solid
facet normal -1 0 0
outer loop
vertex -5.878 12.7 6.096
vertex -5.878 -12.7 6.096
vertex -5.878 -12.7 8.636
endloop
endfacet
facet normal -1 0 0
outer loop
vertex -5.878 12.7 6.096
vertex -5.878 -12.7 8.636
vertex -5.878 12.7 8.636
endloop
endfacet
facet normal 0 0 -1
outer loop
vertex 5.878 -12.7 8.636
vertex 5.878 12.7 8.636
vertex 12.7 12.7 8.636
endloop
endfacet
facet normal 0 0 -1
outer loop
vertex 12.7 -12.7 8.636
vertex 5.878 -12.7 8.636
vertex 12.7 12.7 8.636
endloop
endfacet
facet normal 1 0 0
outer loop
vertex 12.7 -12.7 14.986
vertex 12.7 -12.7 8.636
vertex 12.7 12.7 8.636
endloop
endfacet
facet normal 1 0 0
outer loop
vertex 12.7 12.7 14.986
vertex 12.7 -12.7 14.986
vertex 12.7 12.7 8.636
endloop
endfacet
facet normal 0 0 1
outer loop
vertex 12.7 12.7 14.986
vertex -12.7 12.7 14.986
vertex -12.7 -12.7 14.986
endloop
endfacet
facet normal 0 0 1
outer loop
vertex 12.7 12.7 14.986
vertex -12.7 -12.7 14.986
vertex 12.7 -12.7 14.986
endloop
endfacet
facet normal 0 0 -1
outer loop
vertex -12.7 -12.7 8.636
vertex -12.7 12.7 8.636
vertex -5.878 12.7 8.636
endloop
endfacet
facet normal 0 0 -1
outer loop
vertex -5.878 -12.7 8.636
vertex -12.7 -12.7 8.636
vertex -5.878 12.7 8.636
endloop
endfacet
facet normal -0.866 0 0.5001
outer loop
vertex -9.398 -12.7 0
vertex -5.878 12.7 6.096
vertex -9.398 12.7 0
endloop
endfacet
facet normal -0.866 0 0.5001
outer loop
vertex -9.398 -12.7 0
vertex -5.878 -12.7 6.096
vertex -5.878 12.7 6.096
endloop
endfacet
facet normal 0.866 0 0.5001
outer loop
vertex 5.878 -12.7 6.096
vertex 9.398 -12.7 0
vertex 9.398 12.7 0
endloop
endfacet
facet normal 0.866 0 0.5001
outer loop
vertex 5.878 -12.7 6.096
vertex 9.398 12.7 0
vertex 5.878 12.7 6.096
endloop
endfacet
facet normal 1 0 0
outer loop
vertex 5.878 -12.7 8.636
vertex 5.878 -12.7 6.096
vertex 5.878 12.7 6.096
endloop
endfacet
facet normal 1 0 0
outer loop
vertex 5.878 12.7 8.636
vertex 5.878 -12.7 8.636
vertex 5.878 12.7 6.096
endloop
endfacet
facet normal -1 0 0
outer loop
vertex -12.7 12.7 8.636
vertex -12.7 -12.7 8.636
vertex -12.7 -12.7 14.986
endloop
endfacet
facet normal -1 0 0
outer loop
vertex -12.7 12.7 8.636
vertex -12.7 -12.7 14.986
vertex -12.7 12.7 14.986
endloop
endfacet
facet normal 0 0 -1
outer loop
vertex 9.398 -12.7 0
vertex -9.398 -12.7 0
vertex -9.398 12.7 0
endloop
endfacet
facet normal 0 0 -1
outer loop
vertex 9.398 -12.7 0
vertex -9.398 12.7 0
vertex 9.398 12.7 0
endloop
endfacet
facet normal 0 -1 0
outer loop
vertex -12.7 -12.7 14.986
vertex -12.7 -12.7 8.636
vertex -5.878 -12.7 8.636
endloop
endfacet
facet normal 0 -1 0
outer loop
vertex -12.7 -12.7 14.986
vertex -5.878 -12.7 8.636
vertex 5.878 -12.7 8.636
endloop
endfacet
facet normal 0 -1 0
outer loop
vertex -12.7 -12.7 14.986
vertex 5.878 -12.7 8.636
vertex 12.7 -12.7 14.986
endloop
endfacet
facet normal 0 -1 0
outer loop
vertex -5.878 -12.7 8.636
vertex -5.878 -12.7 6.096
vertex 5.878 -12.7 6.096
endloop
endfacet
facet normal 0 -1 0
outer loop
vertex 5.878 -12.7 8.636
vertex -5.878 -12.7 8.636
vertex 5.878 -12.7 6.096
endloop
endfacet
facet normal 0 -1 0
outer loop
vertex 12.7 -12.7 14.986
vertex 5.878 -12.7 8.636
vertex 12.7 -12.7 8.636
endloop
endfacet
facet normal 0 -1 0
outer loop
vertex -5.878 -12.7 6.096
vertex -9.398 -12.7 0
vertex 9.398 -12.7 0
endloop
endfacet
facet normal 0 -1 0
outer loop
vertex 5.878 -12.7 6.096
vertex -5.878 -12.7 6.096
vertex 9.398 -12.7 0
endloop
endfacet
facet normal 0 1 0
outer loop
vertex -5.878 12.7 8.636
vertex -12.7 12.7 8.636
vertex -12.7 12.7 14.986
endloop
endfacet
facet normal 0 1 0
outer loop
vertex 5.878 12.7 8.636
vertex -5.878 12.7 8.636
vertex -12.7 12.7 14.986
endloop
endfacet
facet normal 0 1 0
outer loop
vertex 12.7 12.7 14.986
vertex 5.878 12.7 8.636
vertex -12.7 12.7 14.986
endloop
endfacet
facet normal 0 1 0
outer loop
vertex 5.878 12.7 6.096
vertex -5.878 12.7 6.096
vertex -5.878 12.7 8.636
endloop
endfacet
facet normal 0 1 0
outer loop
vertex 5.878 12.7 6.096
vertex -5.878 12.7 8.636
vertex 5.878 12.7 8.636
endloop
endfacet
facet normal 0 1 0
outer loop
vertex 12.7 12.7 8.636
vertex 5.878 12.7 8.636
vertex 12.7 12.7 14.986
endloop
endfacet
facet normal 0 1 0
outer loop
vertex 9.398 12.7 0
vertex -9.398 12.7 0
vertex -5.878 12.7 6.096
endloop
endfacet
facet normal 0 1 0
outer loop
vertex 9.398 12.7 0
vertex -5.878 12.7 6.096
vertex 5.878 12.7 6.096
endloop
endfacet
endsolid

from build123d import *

# Parameters (mm, degrees)
F1_DEPTH      = 12.7
F1_DEPTH_BACK = 12.7
F2_W          = 11.756946
F2_H          = 25.4
F3_DEPTH      = 2.54
F4_W          = 25.4
F4_H          = 25.4
F5_DEPTH      = 6.35


with BuildPart() as f1:
    # F0 (on Front) → F1 (new body, two sides)
    with BuildSketch(Plane.XZ) as f1_sk:
        Polygon((-5.878473, 6.096), (-9.398, 0), (9.398, 0), (5.878473, 6.096), align=None)
    extrude(amount=F1_DEPTH)
    extrude(f1_sk.sketch, amount=-F1_DEPTH_BACK)

    # F2 (on face) → F3 (join)
    with BuildSketch(Plane.XY.offset(6.096)):
        Rectangle(F2_W, F2_H)
    extrude(amount=F3_DEPTH)

    # F4 (on face) → F5 (join)
    with BuildSketch(Plane.XY.offset(8.636)):
        Rectangle(F4_W, F4_H)
    extrude(amount=F5_DEPTH)


solid = f1.part
